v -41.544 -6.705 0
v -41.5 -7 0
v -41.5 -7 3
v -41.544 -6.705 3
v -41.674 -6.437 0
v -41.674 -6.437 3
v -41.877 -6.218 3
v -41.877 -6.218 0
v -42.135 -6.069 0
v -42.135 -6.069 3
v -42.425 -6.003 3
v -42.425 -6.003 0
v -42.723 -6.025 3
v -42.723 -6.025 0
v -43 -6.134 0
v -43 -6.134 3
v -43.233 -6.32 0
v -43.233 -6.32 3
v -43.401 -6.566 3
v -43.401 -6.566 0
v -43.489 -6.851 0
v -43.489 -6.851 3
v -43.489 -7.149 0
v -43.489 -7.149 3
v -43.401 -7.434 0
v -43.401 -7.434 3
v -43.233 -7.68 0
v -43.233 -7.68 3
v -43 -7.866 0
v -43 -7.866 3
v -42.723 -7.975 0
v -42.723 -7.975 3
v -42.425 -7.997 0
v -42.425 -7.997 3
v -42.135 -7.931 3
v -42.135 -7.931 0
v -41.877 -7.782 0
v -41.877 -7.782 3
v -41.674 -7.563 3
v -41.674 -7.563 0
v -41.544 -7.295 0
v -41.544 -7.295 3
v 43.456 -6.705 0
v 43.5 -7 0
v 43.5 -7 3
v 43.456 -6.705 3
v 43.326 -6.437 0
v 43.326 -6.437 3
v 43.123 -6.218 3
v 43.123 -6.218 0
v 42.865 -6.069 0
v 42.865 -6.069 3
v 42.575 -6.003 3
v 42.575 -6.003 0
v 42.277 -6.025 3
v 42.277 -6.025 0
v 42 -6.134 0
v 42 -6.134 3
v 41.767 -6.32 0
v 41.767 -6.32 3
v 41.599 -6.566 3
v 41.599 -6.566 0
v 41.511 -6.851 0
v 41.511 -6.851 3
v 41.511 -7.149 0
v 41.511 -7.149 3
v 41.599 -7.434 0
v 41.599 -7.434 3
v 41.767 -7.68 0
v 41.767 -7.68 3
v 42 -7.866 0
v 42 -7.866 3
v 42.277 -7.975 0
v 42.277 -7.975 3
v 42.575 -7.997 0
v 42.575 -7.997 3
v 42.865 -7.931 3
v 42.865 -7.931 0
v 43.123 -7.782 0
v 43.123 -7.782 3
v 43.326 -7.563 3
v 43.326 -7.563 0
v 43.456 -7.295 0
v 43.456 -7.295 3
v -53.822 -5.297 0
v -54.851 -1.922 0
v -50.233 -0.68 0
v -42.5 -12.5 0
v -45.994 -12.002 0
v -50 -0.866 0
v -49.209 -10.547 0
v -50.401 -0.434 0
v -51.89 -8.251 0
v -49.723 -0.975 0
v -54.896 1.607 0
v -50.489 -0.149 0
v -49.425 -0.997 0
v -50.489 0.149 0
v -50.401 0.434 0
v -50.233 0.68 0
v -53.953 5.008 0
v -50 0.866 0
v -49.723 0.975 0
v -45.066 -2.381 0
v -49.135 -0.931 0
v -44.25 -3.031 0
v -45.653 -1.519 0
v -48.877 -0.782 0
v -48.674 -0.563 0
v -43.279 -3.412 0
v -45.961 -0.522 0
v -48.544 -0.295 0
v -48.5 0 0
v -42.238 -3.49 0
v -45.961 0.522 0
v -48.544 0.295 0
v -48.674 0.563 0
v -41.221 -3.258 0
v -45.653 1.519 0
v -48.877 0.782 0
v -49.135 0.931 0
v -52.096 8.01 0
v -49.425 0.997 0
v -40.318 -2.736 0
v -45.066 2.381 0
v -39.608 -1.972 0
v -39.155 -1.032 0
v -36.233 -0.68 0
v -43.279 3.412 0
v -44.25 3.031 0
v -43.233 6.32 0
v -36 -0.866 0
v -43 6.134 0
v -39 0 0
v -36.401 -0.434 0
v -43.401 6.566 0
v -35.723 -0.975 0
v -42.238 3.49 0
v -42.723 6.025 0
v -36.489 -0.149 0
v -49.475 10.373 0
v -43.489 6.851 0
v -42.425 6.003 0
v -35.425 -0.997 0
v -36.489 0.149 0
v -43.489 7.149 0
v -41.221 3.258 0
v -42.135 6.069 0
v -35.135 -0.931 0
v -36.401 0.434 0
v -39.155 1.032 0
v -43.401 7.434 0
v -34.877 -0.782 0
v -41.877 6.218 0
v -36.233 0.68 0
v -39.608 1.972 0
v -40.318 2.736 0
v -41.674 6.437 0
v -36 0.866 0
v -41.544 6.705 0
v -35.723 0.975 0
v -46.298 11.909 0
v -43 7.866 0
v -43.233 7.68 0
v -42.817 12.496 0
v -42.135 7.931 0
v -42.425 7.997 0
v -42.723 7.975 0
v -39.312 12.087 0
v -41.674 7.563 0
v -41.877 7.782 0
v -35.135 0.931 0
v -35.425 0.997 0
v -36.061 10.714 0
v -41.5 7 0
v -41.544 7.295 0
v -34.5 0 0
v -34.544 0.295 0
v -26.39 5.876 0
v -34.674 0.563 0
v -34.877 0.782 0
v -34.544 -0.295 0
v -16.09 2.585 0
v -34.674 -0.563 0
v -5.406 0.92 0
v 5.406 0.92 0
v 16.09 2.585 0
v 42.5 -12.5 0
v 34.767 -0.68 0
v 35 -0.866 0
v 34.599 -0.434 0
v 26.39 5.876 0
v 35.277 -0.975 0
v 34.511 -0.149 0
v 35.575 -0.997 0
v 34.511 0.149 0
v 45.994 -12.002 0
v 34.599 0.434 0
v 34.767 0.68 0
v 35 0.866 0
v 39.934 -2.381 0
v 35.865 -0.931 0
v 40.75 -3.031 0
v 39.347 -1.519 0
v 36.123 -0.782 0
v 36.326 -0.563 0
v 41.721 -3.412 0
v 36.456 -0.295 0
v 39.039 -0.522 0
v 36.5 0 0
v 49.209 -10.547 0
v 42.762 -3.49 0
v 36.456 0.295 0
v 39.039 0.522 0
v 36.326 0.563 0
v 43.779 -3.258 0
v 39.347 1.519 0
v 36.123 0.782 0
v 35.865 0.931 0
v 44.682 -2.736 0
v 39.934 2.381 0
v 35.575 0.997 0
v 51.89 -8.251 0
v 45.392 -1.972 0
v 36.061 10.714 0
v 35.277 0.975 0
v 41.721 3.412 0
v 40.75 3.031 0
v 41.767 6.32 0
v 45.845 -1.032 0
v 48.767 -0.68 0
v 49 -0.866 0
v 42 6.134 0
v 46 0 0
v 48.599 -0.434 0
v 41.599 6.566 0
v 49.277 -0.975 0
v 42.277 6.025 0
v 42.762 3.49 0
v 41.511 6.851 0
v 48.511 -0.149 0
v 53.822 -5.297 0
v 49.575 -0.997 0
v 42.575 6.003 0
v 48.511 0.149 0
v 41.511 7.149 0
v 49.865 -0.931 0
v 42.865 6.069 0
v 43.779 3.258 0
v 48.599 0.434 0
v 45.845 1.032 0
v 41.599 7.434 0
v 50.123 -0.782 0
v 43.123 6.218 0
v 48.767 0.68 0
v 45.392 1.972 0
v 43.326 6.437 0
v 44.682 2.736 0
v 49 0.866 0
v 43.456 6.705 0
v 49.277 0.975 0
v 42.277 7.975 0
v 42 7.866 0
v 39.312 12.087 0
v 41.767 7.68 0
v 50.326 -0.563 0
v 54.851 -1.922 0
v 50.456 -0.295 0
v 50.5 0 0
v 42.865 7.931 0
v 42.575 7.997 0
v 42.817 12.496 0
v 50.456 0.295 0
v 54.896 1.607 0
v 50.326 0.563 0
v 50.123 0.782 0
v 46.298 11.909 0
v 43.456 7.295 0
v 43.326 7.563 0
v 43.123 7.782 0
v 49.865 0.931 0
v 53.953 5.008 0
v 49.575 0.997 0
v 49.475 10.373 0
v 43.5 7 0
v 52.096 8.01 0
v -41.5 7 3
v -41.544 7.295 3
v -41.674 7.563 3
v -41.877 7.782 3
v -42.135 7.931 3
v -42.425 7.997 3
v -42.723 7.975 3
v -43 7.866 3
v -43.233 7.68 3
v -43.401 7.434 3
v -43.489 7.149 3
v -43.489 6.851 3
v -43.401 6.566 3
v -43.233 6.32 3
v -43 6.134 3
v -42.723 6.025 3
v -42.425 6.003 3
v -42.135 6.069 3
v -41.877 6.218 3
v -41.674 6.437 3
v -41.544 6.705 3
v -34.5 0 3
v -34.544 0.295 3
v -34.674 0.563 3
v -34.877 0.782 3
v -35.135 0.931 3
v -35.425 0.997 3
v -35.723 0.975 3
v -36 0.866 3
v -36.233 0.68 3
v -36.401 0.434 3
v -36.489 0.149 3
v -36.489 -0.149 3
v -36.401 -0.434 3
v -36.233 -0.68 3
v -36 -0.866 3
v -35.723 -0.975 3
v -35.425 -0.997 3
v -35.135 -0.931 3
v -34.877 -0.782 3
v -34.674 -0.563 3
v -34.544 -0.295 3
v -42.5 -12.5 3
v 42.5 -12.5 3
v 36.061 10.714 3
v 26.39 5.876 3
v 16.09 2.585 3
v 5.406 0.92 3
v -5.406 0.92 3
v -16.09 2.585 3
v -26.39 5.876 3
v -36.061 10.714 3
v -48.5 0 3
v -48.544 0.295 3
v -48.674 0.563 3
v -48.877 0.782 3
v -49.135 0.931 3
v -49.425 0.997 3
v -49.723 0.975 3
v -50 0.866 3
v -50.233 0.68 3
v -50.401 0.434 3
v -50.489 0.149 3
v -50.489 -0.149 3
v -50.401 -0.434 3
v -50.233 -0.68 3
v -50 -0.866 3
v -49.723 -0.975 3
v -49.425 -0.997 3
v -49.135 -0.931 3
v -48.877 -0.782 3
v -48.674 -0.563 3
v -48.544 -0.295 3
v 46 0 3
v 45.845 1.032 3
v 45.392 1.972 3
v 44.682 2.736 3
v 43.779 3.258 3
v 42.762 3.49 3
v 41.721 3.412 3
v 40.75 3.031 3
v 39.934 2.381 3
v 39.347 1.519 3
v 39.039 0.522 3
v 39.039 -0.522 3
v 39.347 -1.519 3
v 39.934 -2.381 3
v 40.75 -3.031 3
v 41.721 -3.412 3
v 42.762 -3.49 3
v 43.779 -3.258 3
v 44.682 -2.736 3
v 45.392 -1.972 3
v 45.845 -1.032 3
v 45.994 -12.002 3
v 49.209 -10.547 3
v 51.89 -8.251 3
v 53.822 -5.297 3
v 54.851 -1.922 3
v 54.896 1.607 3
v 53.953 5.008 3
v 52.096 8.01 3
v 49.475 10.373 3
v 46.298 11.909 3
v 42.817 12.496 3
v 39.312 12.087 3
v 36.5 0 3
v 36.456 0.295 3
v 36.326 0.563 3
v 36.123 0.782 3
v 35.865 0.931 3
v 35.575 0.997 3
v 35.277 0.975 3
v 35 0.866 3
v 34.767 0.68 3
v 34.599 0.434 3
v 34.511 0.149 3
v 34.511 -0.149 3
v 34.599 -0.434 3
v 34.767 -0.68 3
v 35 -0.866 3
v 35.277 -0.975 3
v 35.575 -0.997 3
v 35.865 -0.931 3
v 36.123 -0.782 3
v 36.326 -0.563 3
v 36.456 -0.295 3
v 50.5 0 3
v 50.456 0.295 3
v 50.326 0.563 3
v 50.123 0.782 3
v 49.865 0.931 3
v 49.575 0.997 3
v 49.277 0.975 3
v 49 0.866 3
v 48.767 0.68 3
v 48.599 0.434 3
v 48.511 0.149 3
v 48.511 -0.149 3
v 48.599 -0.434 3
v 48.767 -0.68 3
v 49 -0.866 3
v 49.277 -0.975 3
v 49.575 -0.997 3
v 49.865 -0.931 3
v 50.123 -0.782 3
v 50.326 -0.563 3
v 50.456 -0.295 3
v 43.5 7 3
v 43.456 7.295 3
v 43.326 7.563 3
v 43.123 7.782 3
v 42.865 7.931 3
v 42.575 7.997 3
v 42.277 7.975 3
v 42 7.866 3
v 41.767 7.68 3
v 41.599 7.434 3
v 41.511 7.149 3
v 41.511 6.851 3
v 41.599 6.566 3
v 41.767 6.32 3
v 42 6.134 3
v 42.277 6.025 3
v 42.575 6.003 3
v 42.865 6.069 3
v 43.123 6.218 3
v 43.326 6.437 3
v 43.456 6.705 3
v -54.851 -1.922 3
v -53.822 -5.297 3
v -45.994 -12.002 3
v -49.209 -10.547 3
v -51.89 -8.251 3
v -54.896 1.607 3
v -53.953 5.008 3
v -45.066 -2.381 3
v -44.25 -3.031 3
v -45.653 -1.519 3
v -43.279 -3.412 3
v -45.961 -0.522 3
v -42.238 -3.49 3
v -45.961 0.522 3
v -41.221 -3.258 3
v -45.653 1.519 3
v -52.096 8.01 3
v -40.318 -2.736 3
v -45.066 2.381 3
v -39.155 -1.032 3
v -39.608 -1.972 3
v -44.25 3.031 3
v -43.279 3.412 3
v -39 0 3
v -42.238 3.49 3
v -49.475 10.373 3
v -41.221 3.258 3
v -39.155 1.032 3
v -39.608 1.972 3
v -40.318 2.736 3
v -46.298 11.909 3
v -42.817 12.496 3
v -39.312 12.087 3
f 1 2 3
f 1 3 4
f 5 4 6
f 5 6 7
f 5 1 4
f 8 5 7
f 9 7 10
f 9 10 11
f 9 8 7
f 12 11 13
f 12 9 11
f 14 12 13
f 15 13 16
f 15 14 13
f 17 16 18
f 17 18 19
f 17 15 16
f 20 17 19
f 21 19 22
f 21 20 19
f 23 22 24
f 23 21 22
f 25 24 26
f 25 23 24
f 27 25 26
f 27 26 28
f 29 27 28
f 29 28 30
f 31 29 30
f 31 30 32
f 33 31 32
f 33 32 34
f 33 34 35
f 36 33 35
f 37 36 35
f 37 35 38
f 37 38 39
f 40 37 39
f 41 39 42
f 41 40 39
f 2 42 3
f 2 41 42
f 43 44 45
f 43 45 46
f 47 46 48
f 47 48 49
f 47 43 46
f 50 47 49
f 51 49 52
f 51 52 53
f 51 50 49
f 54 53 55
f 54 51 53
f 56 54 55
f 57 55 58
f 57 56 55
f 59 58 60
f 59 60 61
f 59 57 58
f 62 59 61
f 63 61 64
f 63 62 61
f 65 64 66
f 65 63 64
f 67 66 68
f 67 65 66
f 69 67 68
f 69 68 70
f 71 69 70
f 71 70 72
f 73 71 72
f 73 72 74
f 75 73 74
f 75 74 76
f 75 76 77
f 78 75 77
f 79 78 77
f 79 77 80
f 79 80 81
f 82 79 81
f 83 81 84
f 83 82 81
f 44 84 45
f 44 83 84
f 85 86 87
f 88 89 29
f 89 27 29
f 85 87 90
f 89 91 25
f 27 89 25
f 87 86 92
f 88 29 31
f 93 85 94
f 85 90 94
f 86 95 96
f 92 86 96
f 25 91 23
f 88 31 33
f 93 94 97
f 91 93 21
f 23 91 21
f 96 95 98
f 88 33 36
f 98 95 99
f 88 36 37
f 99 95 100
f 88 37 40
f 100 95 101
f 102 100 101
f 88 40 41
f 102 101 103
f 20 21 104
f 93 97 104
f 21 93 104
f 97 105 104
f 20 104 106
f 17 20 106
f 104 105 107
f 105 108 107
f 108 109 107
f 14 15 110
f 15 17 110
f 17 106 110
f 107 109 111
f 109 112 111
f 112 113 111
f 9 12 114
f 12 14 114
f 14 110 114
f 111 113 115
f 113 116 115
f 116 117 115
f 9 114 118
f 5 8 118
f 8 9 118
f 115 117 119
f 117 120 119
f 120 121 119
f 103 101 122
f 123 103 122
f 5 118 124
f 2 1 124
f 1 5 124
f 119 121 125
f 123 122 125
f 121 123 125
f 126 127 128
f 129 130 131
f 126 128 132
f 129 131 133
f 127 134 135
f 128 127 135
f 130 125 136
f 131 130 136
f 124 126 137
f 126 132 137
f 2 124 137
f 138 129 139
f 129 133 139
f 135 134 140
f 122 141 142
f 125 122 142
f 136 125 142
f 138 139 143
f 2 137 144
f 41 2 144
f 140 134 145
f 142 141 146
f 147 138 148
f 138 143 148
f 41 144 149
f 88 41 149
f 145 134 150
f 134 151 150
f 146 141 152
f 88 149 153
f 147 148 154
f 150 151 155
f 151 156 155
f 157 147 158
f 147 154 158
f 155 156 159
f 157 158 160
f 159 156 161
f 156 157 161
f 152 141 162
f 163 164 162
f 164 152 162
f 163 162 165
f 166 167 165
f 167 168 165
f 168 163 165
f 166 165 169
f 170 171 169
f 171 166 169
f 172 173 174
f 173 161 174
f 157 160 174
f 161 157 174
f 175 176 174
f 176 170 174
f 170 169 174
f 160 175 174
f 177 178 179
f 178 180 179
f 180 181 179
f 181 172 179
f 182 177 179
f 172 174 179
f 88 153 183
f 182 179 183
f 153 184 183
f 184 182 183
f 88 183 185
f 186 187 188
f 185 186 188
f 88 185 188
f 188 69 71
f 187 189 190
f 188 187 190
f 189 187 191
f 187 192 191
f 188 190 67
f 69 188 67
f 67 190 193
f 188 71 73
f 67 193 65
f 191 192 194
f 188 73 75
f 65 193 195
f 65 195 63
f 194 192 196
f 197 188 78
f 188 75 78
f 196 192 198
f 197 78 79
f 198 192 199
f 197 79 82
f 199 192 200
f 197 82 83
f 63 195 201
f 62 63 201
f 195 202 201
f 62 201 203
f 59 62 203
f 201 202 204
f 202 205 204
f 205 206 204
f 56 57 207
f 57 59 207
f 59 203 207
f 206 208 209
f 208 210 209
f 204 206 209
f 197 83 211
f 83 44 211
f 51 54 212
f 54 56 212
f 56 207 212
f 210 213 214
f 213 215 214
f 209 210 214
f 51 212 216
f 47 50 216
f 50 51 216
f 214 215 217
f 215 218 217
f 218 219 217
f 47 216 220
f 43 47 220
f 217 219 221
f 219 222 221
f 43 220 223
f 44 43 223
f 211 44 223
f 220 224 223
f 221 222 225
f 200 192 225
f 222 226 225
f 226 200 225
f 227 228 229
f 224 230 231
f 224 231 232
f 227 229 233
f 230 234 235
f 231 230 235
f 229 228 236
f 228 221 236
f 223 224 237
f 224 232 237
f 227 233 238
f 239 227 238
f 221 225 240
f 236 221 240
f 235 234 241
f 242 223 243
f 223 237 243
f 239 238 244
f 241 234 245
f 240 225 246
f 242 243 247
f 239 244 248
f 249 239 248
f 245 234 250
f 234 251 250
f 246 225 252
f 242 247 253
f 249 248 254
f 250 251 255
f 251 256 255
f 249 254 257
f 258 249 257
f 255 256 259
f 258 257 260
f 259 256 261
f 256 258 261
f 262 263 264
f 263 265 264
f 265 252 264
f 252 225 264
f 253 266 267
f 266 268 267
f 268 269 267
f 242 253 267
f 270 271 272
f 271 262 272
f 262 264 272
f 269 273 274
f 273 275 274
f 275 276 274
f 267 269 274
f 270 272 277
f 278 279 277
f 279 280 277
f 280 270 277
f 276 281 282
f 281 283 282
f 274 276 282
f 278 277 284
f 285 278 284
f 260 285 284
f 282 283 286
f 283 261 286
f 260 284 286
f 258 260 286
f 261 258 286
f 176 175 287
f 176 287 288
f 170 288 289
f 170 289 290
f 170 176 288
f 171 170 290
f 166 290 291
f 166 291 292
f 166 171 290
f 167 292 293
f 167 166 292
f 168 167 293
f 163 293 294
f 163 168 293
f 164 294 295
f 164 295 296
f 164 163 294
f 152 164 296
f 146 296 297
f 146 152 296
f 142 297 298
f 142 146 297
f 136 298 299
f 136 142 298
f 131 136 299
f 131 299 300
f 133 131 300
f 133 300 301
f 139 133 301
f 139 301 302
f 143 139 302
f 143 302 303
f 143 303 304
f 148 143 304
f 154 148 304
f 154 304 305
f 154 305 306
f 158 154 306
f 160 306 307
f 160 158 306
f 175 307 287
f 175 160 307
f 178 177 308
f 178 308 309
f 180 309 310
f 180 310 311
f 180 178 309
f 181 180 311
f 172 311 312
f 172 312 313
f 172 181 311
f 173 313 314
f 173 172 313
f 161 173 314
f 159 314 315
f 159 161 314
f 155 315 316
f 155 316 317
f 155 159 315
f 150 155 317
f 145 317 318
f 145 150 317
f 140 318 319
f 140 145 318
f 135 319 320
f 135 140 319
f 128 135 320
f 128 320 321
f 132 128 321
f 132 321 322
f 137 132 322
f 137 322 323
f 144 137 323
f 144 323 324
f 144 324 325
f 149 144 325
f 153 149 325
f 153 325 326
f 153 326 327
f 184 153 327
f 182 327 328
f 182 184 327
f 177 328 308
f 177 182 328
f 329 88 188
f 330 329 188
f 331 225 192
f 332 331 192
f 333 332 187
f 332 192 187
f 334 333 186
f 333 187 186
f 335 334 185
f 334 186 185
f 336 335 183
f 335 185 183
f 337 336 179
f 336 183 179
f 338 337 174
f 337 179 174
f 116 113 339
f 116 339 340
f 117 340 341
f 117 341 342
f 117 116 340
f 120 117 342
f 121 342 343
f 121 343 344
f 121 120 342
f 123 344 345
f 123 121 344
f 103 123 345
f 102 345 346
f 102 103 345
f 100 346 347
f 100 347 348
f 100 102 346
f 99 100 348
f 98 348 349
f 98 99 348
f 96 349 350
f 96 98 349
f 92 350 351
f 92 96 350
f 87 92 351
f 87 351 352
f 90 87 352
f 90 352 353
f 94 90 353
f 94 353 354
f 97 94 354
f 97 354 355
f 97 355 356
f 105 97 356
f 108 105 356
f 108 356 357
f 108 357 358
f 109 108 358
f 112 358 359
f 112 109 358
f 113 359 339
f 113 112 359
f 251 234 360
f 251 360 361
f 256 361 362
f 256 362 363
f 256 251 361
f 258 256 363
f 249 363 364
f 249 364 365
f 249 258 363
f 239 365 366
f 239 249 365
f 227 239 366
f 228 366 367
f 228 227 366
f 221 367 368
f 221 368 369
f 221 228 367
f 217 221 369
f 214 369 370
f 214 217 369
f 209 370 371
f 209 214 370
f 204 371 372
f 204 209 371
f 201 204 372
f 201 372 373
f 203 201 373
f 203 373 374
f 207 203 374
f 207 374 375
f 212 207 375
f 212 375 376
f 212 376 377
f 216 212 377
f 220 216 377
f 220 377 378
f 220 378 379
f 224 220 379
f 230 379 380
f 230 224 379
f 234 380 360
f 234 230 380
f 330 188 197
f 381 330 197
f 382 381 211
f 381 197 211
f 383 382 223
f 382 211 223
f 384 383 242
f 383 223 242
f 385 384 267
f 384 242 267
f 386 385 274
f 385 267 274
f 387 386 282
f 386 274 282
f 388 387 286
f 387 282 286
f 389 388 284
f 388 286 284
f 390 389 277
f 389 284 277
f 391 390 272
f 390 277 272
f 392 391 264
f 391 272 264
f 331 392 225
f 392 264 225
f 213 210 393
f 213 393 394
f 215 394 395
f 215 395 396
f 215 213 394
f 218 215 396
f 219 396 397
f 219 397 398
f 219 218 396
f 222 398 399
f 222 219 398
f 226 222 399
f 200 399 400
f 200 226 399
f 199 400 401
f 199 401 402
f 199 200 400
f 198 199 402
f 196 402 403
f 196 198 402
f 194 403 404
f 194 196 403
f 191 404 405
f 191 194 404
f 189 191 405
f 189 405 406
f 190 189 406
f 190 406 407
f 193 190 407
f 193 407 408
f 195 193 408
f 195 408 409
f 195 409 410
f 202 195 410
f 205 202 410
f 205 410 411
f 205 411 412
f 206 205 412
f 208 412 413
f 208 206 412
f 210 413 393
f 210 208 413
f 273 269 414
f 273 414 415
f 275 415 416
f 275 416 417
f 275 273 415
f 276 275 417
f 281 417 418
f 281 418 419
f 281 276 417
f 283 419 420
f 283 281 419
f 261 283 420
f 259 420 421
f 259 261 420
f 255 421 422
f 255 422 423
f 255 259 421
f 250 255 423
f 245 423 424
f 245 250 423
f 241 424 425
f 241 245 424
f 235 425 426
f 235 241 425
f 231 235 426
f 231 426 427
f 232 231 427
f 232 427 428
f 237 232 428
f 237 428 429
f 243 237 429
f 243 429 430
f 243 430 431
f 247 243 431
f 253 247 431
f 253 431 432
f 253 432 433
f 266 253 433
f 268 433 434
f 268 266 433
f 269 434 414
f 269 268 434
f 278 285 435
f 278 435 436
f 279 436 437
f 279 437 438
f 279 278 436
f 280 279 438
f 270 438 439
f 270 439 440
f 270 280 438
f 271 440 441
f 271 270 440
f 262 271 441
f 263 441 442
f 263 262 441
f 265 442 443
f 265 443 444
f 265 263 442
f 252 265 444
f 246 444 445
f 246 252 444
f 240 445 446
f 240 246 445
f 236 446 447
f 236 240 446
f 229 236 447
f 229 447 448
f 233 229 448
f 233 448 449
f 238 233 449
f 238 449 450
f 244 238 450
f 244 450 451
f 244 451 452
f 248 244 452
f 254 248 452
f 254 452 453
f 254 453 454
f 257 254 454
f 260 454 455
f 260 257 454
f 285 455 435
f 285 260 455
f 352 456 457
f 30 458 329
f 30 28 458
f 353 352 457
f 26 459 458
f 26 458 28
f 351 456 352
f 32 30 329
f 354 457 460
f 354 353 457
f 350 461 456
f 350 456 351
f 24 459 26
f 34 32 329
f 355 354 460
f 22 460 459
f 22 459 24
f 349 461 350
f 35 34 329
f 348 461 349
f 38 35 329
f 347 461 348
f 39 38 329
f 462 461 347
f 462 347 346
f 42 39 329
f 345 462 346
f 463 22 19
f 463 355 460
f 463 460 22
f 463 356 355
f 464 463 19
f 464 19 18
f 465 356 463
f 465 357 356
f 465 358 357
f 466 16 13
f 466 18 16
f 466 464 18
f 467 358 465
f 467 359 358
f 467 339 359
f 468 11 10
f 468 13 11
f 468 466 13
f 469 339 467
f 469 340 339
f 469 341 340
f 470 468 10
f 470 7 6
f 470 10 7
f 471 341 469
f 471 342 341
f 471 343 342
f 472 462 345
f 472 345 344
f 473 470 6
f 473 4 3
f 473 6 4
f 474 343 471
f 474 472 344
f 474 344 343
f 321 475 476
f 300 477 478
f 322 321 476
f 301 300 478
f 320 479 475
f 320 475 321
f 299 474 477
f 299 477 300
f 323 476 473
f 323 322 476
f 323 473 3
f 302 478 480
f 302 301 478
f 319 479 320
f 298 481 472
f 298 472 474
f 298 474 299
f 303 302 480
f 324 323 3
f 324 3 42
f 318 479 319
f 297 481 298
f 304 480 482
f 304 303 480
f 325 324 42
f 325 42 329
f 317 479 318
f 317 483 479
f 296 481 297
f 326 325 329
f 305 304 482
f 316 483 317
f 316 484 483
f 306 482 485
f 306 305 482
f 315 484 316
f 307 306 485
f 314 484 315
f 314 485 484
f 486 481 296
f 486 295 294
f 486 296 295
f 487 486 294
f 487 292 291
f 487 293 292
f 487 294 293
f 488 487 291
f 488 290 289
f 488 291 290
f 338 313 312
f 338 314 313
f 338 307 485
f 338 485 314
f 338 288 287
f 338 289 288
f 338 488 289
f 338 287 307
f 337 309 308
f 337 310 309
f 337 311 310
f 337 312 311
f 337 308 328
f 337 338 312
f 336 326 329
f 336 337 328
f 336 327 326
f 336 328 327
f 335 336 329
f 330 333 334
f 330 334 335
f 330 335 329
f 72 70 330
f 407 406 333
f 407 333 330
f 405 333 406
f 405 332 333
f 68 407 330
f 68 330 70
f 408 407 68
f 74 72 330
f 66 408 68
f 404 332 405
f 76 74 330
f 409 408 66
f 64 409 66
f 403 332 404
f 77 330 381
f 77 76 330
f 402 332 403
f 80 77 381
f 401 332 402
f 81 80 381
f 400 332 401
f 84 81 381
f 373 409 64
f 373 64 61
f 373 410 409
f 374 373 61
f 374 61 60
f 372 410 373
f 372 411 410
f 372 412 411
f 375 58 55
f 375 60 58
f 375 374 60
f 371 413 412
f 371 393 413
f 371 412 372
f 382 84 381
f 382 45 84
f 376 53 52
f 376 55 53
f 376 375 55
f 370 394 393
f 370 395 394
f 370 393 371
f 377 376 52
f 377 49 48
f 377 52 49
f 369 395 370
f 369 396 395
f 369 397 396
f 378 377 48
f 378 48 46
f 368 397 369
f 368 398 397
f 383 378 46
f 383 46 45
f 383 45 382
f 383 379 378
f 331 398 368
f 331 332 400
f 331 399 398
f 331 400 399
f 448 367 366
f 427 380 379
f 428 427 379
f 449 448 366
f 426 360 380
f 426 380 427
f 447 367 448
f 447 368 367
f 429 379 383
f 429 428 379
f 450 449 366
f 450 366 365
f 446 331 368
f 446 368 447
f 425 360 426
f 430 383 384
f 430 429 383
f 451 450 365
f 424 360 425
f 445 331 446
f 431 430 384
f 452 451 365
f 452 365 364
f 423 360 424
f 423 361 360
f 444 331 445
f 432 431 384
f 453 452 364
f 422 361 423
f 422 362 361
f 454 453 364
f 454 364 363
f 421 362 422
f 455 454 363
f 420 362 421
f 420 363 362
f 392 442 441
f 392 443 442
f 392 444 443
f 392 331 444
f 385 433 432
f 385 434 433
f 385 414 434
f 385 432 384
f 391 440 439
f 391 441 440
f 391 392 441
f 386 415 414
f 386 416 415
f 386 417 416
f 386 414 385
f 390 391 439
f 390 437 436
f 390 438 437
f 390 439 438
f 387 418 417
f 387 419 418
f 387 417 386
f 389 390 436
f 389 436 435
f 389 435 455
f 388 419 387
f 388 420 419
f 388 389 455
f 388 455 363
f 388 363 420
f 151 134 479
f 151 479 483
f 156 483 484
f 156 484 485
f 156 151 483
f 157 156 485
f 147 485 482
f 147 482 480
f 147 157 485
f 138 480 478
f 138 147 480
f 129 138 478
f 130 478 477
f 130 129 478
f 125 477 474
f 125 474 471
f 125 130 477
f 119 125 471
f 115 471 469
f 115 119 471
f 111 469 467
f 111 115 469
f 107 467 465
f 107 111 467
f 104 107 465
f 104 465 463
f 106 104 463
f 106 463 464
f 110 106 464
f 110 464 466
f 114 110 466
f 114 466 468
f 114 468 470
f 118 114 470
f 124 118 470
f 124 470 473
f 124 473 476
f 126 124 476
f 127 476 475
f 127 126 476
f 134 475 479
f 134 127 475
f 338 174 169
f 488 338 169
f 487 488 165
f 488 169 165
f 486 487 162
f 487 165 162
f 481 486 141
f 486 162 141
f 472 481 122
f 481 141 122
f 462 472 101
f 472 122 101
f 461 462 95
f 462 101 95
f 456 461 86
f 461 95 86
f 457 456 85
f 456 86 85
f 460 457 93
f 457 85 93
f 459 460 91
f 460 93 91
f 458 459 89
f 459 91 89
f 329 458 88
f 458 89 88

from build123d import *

# Parameters (mm, degrees)
SKETCH1_R           = 3.5
SKETCH1_R_2         = 1
BOSS_EXTRUDE1_DEPTH = 3


with BuildPart() as part:
    # Sketch1 → Boss-Extrude1 (new body)
    with BuildSketch(Plane.XY):
        with BuildLine():
            Line((-42.5, -12.5), (42.5, -12.5))
            ThreePointArc((42.5, -12.5), (54.545159585, 3.341276787), (36.060606061, 10.713739109))
            ThreePointArc((36.060606061, 10.713739109), (0, 0.710678119), (-36.060606061, 10.713739109))
            ThreePointArc((-36.060606061, 10.713739109), (-54.545159585, 3.341276787), (-42.5, -12.5))
        make_face()
        with Locations((-42.5, 0)):
            Circle(SKETCH1_R, mode=Mode.SUBTRACT)
        with Locations((42.5, 0)):
            Circle(SKETCH1_R, mode=Mode.SUBTRACT)
        with Locations((-42.5, 7)):
            Circle(SKETCH1_R_2, mode=Mode.SUBTRACT)
        with Locations((-35.5, 0)):
            Circle(SKETCH1_R_2, mode=Mode.SUBTRACT)
        with Locations((-42.5, -7)):
            Circle(SKETCH1_R_2, mode=Mode.SUBTRACT)
        with Locations((-49.5, 0)):
            Circle(SKETCH1_R_2, mode=Mode.SUBTRACT)
        with Locations((42.5, 7)):
            Circle(SKETCH1_R_2, mode=Mode.SUBTRACT)
        with Locations((35.5, 0)):
            Circle(SKETCH1_R_2, mode=Mode.SUBTRACT)
        with Locations((42.5, -7)):
            Circle(SKETCH1_R_2, mode=Mode.SUBTRACT)
        with Locations((49.5, 0)):
            Circle(SKETCH1_R_2, mode=Mode.SUBTRACT)
    extrude(amount=BOSS_EXTRUDE1_DEPTH)


solid = part.part
